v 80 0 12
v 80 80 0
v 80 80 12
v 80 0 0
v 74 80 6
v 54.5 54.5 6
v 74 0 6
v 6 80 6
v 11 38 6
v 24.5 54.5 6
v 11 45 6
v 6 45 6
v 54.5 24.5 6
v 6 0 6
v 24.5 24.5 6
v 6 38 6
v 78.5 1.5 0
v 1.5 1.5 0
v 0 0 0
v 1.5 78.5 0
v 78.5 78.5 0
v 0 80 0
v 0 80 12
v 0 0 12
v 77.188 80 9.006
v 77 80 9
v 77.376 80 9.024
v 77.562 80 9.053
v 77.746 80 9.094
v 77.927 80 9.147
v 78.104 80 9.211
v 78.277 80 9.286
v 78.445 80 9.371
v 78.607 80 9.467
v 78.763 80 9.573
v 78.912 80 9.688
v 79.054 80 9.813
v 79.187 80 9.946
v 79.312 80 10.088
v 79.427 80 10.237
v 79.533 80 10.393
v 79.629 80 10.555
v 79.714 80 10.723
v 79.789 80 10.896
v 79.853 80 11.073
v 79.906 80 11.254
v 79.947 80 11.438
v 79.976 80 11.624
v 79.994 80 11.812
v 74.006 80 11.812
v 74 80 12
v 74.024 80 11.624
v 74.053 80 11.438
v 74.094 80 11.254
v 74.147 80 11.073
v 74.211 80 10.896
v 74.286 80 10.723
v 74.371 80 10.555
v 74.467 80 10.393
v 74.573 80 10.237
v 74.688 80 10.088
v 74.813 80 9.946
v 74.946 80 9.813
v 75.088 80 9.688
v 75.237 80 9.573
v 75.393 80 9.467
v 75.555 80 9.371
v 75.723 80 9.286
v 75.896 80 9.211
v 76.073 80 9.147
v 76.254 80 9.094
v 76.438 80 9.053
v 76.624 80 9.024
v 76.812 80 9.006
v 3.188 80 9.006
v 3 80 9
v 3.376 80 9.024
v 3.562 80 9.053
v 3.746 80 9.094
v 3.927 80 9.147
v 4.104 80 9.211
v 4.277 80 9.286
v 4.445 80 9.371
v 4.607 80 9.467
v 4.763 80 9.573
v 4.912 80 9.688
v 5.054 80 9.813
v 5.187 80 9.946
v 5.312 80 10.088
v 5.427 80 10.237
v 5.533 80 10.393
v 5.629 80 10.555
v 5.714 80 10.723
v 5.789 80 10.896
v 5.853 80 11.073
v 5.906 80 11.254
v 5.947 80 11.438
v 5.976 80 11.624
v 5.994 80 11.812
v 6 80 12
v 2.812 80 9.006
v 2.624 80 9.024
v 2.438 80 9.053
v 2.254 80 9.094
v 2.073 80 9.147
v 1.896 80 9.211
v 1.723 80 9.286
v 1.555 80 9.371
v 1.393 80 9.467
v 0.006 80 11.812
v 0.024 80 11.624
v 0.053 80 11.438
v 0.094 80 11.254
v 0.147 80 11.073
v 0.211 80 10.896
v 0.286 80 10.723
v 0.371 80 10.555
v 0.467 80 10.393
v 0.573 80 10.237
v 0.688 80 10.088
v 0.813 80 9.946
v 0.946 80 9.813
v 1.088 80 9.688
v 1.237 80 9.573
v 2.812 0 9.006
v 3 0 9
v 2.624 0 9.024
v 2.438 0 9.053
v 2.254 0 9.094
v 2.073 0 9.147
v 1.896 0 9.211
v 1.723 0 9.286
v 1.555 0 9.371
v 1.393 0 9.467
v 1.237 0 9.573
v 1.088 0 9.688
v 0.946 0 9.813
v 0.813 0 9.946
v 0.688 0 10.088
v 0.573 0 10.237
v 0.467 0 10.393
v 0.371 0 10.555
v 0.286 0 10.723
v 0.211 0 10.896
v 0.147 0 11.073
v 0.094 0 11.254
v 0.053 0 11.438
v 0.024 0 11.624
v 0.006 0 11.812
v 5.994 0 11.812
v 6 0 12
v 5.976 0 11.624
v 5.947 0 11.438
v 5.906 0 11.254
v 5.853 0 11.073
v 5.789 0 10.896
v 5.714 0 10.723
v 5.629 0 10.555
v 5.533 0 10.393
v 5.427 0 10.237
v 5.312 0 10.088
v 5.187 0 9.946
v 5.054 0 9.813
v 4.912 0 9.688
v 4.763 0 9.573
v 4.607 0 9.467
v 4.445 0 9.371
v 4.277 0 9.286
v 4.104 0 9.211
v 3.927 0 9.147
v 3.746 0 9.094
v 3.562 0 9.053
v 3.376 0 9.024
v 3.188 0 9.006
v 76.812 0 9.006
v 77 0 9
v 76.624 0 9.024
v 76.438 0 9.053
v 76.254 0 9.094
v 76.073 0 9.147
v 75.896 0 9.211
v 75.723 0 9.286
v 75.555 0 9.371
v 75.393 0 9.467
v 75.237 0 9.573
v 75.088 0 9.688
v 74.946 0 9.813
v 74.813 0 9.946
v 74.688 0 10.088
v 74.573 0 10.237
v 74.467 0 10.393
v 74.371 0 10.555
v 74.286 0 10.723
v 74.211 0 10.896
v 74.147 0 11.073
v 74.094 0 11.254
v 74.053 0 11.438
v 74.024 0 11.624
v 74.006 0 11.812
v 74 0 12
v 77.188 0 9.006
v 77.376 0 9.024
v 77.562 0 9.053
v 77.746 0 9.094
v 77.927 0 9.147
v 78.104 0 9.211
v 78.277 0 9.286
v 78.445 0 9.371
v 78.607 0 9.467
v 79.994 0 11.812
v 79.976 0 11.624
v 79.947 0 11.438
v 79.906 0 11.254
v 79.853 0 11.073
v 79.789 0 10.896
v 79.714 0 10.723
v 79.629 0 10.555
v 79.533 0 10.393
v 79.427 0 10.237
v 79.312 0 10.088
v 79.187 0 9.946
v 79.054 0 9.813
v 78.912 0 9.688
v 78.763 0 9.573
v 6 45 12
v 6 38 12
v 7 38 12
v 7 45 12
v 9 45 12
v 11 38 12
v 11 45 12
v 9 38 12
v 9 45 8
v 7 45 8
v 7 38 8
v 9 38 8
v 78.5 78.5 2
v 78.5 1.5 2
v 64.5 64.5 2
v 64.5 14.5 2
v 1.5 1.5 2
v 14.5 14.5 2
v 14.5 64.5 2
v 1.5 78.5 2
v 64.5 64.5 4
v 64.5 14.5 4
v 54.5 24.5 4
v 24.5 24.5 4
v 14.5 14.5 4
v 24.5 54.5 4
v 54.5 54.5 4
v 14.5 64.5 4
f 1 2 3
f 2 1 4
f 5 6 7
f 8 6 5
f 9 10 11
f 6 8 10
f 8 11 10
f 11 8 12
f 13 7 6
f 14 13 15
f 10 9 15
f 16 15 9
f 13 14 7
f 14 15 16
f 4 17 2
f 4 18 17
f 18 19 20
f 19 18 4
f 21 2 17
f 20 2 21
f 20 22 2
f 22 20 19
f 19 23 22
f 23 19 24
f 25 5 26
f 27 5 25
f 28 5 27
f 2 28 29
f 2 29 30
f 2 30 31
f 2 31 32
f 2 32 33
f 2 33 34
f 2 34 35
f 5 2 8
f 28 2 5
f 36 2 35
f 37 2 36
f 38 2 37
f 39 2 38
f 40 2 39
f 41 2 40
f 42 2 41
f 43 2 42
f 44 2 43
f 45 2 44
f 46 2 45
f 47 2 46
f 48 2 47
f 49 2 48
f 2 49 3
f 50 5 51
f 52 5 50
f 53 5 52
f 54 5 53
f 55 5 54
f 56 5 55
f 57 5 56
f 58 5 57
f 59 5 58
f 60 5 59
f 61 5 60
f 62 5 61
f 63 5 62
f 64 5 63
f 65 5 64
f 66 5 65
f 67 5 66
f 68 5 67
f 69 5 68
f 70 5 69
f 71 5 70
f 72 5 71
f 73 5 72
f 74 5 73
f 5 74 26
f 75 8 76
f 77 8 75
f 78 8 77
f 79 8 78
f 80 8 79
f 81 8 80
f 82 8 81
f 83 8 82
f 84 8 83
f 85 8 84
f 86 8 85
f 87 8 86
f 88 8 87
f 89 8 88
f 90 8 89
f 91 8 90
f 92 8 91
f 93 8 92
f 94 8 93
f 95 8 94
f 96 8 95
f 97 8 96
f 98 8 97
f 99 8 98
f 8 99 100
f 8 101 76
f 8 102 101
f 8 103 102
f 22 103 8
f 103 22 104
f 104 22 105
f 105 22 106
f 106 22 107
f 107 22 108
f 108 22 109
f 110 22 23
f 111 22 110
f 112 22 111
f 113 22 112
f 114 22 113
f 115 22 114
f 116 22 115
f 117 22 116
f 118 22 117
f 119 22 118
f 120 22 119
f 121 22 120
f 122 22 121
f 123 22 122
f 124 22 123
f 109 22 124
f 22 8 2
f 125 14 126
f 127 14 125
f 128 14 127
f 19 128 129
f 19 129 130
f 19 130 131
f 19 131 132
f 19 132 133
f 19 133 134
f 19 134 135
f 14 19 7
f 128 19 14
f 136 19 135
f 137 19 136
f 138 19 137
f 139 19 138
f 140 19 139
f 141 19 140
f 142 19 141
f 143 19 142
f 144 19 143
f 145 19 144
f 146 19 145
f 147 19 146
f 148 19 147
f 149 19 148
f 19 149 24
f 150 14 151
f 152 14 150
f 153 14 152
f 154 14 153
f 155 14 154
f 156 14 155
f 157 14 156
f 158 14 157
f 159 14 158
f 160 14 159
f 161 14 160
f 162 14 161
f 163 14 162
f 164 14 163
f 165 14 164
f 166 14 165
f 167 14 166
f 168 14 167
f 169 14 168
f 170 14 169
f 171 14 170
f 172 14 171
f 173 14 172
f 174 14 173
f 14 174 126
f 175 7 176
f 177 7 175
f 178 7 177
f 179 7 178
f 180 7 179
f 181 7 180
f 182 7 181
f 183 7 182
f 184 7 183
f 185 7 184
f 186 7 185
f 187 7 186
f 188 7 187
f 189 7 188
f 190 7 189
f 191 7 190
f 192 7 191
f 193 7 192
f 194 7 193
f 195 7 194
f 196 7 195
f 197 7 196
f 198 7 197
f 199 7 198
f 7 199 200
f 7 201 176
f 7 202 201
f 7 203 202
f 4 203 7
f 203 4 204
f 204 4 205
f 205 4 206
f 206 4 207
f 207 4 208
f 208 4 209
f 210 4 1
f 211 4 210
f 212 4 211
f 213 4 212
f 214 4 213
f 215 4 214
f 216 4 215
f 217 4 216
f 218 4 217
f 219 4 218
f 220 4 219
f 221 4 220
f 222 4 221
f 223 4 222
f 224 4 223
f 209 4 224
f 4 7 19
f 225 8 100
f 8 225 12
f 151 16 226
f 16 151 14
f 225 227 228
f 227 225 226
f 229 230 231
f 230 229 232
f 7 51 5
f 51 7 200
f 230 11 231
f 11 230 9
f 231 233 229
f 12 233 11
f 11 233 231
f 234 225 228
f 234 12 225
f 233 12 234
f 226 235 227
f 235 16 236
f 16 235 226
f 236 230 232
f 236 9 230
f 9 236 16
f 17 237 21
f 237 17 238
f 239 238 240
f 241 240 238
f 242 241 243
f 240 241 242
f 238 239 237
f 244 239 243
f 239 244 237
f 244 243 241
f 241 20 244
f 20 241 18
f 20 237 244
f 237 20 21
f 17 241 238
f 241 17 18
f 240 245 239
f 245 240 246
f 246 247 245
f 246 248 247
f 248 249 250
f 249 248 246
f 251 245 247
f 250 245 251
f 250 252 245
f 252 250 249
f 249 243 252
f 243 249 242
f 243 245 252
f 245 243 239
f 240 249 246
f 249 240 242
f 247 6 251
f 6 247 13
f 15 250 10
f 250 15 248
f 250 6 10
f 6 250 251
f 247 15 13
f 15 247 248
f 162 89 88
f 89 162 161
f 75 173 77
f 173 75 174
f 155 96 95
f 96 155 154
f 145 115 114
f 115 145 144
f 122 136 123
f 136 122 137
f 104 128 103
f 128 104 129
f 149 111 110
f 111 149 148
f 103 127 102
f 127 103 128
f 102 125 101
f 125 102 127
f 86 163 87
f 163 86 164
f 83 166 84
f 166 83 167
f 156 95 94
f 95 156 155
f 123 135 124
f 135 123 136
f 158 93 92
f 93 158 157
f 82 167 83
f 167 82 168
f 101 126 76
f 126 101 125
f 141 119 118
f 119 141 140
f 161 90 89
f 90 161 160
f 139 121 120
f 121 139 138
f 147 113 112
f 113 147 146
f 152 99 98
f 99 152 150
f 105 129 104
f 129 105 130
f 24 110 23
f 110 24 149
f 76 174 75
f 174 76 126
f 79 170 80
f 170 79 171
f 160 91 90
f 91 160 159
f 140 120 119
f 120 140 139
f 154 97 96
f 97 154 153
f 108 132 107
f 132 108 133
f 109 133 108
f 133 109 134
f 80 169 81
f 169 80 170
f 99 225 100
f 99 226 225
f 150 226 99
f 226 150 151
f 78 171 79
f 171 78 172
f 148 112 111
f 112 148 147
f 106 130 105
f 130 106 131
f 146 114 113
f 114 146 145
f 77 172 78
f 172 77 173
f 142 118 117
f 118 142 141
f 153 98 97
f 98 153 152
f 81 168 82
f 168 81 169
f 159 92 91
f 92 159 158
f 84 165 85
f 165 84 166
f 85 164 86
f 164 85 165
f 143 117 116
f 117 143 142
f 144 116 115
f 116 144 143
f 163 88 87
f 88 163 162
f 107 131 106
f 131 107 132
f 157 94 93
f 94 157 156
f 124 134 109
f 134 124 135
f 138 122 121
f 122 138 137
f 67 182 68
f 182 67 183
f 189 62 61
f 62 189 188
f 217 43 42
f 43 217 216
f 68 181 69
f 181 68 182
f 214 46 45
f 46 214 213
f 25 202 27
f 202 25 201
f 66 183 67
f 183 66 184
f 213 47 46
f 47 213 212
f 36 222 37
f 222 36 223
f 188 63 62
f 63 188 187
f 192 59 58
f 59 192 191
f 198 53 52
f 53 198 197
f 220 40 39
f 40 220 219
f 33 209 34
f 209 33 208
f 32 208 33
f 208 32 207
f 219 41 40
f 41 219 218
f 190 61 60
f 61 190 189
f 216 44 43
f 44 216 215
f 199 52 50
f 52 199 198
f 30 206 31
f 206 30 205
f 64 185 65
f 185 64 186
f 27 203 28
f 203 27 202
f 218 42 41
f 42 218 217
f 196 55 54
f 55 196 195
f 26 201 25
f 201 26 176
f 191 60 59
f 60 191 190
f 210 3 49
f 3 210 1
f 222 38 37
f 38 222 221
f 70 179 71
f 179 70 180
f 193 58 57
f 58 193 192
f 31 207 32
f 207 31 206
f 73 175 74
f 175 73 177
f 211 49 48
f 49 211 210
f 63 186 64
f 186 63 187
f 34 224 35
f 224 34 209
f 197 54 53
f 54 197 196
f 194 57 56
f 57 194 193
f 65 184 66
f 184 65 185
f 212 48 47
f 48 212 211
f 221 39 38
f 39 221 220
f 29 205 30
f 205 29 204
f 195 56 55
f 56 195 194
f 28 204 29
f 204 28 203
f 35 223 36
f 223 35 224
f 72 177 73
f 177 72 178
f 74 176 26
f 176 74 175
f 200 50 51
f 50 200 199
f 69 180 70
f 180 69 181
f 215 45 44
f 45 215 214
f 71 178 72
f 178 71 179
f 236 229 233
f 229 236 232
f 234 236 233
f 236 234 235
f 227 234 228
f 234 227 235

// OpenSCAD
$fn=100;
/*
translate([0, 177, 0]) rotate([90, 0, 0]) cylinder(d=6, h=177);

translate([67, 177, 0]) rotate([90, 0, 0]) cylinder(d=6, h=177);

translate([15, 0, -10]) rotate([270, 0, 0]) motor();

translate([-5, 60, -1]) postIts();

translate([0, 200, 0]) cylinder(d=15, h=11);
*/

difference() {
    union() {
        cube([80, 80, 6]);
        translate([0, 0, 5]) cube([6, 80, 7]);
        translate([74, 0, 5]) cube([6, 80, 7]);
        translate([6, 38, 5]) cube([5, 7, 7]);
    }
    union () {
        translate([1.5, 1.5, -8]) postIts();
        translate([3, 0, 12]) rails();
        translate([7, 37, 8]) cube([2, 9, 8]);
    }
}

module postIts() {
    cube([77, 77, 10]);
    translate([13, 13, 0]) cube([50, 50, 12]);
    translate([23, 23, 0]) cube([30, 30, 15]);
}



module rails() {
    translate([0, 176, 0]) rotate([90, 0, 0]) cylinder(d=6, h=177);
    translate([74, 176, 0]) rotate([90, 0, 0]) cylinder(d=6, h=177);
}


module bearingPlate() {
    difference() {
        union() {
    translate([-8 + 4, -47, -4]) cube([120, 5, 50]);

        }
        union() {
    translate([21, -38, 21])
    rotate([90, 0, 0])
        bearing();

    translate([21 + 35, -38, 21])
    rotate([90, 0, 0])
        cylinder(d=10, h=30);

    translate([21 + 70, -38, 21])
    rotate([90, 0, 0])
        bearing();

        }


    }
}

module bearing() {
    cylinder(d=22, h=7);
    translate([0, 0, -2])
        cylinder(d=8, h=12);

}

module motor() {
    cube([42, 33, 42]);

    translate([5, 33, 5])
        rotate([90, 0, 0])
            cylinder(d=4, h=50);

    translate([5, 33 - 38, 5])
        rotate([90, 0, 0])
            cylinder(d=8, h=50);


    translate([36, 33, 5])
        rotate([90, 0, 0])
            cylinder(d=4, h=50);

    translate([36, 33 - 38, 5])
        rotate([90, 0, 0])
            cylinder(d=8, h=50);

    translate([5, 33, 36])
        rotate([90, 0, 0])
            cylinder(d=4, h=50);

    translate([5, 33 - 38, 36])
        rotate([90, 0, 0])
            cylinder(d=8, h=50);

    translate([36, 33, 36])
        rotate([90, 0, 0])
            cylinder(d=4, h=50);

    translate([36, 33 - 38, 36])
        rotate([90, 0, 0])
            cylinder(d=8, h=50);


    translate([21, 33, 21])
        rotate([90, 0, 0])
            cylinder(d=22, h=50);
}
